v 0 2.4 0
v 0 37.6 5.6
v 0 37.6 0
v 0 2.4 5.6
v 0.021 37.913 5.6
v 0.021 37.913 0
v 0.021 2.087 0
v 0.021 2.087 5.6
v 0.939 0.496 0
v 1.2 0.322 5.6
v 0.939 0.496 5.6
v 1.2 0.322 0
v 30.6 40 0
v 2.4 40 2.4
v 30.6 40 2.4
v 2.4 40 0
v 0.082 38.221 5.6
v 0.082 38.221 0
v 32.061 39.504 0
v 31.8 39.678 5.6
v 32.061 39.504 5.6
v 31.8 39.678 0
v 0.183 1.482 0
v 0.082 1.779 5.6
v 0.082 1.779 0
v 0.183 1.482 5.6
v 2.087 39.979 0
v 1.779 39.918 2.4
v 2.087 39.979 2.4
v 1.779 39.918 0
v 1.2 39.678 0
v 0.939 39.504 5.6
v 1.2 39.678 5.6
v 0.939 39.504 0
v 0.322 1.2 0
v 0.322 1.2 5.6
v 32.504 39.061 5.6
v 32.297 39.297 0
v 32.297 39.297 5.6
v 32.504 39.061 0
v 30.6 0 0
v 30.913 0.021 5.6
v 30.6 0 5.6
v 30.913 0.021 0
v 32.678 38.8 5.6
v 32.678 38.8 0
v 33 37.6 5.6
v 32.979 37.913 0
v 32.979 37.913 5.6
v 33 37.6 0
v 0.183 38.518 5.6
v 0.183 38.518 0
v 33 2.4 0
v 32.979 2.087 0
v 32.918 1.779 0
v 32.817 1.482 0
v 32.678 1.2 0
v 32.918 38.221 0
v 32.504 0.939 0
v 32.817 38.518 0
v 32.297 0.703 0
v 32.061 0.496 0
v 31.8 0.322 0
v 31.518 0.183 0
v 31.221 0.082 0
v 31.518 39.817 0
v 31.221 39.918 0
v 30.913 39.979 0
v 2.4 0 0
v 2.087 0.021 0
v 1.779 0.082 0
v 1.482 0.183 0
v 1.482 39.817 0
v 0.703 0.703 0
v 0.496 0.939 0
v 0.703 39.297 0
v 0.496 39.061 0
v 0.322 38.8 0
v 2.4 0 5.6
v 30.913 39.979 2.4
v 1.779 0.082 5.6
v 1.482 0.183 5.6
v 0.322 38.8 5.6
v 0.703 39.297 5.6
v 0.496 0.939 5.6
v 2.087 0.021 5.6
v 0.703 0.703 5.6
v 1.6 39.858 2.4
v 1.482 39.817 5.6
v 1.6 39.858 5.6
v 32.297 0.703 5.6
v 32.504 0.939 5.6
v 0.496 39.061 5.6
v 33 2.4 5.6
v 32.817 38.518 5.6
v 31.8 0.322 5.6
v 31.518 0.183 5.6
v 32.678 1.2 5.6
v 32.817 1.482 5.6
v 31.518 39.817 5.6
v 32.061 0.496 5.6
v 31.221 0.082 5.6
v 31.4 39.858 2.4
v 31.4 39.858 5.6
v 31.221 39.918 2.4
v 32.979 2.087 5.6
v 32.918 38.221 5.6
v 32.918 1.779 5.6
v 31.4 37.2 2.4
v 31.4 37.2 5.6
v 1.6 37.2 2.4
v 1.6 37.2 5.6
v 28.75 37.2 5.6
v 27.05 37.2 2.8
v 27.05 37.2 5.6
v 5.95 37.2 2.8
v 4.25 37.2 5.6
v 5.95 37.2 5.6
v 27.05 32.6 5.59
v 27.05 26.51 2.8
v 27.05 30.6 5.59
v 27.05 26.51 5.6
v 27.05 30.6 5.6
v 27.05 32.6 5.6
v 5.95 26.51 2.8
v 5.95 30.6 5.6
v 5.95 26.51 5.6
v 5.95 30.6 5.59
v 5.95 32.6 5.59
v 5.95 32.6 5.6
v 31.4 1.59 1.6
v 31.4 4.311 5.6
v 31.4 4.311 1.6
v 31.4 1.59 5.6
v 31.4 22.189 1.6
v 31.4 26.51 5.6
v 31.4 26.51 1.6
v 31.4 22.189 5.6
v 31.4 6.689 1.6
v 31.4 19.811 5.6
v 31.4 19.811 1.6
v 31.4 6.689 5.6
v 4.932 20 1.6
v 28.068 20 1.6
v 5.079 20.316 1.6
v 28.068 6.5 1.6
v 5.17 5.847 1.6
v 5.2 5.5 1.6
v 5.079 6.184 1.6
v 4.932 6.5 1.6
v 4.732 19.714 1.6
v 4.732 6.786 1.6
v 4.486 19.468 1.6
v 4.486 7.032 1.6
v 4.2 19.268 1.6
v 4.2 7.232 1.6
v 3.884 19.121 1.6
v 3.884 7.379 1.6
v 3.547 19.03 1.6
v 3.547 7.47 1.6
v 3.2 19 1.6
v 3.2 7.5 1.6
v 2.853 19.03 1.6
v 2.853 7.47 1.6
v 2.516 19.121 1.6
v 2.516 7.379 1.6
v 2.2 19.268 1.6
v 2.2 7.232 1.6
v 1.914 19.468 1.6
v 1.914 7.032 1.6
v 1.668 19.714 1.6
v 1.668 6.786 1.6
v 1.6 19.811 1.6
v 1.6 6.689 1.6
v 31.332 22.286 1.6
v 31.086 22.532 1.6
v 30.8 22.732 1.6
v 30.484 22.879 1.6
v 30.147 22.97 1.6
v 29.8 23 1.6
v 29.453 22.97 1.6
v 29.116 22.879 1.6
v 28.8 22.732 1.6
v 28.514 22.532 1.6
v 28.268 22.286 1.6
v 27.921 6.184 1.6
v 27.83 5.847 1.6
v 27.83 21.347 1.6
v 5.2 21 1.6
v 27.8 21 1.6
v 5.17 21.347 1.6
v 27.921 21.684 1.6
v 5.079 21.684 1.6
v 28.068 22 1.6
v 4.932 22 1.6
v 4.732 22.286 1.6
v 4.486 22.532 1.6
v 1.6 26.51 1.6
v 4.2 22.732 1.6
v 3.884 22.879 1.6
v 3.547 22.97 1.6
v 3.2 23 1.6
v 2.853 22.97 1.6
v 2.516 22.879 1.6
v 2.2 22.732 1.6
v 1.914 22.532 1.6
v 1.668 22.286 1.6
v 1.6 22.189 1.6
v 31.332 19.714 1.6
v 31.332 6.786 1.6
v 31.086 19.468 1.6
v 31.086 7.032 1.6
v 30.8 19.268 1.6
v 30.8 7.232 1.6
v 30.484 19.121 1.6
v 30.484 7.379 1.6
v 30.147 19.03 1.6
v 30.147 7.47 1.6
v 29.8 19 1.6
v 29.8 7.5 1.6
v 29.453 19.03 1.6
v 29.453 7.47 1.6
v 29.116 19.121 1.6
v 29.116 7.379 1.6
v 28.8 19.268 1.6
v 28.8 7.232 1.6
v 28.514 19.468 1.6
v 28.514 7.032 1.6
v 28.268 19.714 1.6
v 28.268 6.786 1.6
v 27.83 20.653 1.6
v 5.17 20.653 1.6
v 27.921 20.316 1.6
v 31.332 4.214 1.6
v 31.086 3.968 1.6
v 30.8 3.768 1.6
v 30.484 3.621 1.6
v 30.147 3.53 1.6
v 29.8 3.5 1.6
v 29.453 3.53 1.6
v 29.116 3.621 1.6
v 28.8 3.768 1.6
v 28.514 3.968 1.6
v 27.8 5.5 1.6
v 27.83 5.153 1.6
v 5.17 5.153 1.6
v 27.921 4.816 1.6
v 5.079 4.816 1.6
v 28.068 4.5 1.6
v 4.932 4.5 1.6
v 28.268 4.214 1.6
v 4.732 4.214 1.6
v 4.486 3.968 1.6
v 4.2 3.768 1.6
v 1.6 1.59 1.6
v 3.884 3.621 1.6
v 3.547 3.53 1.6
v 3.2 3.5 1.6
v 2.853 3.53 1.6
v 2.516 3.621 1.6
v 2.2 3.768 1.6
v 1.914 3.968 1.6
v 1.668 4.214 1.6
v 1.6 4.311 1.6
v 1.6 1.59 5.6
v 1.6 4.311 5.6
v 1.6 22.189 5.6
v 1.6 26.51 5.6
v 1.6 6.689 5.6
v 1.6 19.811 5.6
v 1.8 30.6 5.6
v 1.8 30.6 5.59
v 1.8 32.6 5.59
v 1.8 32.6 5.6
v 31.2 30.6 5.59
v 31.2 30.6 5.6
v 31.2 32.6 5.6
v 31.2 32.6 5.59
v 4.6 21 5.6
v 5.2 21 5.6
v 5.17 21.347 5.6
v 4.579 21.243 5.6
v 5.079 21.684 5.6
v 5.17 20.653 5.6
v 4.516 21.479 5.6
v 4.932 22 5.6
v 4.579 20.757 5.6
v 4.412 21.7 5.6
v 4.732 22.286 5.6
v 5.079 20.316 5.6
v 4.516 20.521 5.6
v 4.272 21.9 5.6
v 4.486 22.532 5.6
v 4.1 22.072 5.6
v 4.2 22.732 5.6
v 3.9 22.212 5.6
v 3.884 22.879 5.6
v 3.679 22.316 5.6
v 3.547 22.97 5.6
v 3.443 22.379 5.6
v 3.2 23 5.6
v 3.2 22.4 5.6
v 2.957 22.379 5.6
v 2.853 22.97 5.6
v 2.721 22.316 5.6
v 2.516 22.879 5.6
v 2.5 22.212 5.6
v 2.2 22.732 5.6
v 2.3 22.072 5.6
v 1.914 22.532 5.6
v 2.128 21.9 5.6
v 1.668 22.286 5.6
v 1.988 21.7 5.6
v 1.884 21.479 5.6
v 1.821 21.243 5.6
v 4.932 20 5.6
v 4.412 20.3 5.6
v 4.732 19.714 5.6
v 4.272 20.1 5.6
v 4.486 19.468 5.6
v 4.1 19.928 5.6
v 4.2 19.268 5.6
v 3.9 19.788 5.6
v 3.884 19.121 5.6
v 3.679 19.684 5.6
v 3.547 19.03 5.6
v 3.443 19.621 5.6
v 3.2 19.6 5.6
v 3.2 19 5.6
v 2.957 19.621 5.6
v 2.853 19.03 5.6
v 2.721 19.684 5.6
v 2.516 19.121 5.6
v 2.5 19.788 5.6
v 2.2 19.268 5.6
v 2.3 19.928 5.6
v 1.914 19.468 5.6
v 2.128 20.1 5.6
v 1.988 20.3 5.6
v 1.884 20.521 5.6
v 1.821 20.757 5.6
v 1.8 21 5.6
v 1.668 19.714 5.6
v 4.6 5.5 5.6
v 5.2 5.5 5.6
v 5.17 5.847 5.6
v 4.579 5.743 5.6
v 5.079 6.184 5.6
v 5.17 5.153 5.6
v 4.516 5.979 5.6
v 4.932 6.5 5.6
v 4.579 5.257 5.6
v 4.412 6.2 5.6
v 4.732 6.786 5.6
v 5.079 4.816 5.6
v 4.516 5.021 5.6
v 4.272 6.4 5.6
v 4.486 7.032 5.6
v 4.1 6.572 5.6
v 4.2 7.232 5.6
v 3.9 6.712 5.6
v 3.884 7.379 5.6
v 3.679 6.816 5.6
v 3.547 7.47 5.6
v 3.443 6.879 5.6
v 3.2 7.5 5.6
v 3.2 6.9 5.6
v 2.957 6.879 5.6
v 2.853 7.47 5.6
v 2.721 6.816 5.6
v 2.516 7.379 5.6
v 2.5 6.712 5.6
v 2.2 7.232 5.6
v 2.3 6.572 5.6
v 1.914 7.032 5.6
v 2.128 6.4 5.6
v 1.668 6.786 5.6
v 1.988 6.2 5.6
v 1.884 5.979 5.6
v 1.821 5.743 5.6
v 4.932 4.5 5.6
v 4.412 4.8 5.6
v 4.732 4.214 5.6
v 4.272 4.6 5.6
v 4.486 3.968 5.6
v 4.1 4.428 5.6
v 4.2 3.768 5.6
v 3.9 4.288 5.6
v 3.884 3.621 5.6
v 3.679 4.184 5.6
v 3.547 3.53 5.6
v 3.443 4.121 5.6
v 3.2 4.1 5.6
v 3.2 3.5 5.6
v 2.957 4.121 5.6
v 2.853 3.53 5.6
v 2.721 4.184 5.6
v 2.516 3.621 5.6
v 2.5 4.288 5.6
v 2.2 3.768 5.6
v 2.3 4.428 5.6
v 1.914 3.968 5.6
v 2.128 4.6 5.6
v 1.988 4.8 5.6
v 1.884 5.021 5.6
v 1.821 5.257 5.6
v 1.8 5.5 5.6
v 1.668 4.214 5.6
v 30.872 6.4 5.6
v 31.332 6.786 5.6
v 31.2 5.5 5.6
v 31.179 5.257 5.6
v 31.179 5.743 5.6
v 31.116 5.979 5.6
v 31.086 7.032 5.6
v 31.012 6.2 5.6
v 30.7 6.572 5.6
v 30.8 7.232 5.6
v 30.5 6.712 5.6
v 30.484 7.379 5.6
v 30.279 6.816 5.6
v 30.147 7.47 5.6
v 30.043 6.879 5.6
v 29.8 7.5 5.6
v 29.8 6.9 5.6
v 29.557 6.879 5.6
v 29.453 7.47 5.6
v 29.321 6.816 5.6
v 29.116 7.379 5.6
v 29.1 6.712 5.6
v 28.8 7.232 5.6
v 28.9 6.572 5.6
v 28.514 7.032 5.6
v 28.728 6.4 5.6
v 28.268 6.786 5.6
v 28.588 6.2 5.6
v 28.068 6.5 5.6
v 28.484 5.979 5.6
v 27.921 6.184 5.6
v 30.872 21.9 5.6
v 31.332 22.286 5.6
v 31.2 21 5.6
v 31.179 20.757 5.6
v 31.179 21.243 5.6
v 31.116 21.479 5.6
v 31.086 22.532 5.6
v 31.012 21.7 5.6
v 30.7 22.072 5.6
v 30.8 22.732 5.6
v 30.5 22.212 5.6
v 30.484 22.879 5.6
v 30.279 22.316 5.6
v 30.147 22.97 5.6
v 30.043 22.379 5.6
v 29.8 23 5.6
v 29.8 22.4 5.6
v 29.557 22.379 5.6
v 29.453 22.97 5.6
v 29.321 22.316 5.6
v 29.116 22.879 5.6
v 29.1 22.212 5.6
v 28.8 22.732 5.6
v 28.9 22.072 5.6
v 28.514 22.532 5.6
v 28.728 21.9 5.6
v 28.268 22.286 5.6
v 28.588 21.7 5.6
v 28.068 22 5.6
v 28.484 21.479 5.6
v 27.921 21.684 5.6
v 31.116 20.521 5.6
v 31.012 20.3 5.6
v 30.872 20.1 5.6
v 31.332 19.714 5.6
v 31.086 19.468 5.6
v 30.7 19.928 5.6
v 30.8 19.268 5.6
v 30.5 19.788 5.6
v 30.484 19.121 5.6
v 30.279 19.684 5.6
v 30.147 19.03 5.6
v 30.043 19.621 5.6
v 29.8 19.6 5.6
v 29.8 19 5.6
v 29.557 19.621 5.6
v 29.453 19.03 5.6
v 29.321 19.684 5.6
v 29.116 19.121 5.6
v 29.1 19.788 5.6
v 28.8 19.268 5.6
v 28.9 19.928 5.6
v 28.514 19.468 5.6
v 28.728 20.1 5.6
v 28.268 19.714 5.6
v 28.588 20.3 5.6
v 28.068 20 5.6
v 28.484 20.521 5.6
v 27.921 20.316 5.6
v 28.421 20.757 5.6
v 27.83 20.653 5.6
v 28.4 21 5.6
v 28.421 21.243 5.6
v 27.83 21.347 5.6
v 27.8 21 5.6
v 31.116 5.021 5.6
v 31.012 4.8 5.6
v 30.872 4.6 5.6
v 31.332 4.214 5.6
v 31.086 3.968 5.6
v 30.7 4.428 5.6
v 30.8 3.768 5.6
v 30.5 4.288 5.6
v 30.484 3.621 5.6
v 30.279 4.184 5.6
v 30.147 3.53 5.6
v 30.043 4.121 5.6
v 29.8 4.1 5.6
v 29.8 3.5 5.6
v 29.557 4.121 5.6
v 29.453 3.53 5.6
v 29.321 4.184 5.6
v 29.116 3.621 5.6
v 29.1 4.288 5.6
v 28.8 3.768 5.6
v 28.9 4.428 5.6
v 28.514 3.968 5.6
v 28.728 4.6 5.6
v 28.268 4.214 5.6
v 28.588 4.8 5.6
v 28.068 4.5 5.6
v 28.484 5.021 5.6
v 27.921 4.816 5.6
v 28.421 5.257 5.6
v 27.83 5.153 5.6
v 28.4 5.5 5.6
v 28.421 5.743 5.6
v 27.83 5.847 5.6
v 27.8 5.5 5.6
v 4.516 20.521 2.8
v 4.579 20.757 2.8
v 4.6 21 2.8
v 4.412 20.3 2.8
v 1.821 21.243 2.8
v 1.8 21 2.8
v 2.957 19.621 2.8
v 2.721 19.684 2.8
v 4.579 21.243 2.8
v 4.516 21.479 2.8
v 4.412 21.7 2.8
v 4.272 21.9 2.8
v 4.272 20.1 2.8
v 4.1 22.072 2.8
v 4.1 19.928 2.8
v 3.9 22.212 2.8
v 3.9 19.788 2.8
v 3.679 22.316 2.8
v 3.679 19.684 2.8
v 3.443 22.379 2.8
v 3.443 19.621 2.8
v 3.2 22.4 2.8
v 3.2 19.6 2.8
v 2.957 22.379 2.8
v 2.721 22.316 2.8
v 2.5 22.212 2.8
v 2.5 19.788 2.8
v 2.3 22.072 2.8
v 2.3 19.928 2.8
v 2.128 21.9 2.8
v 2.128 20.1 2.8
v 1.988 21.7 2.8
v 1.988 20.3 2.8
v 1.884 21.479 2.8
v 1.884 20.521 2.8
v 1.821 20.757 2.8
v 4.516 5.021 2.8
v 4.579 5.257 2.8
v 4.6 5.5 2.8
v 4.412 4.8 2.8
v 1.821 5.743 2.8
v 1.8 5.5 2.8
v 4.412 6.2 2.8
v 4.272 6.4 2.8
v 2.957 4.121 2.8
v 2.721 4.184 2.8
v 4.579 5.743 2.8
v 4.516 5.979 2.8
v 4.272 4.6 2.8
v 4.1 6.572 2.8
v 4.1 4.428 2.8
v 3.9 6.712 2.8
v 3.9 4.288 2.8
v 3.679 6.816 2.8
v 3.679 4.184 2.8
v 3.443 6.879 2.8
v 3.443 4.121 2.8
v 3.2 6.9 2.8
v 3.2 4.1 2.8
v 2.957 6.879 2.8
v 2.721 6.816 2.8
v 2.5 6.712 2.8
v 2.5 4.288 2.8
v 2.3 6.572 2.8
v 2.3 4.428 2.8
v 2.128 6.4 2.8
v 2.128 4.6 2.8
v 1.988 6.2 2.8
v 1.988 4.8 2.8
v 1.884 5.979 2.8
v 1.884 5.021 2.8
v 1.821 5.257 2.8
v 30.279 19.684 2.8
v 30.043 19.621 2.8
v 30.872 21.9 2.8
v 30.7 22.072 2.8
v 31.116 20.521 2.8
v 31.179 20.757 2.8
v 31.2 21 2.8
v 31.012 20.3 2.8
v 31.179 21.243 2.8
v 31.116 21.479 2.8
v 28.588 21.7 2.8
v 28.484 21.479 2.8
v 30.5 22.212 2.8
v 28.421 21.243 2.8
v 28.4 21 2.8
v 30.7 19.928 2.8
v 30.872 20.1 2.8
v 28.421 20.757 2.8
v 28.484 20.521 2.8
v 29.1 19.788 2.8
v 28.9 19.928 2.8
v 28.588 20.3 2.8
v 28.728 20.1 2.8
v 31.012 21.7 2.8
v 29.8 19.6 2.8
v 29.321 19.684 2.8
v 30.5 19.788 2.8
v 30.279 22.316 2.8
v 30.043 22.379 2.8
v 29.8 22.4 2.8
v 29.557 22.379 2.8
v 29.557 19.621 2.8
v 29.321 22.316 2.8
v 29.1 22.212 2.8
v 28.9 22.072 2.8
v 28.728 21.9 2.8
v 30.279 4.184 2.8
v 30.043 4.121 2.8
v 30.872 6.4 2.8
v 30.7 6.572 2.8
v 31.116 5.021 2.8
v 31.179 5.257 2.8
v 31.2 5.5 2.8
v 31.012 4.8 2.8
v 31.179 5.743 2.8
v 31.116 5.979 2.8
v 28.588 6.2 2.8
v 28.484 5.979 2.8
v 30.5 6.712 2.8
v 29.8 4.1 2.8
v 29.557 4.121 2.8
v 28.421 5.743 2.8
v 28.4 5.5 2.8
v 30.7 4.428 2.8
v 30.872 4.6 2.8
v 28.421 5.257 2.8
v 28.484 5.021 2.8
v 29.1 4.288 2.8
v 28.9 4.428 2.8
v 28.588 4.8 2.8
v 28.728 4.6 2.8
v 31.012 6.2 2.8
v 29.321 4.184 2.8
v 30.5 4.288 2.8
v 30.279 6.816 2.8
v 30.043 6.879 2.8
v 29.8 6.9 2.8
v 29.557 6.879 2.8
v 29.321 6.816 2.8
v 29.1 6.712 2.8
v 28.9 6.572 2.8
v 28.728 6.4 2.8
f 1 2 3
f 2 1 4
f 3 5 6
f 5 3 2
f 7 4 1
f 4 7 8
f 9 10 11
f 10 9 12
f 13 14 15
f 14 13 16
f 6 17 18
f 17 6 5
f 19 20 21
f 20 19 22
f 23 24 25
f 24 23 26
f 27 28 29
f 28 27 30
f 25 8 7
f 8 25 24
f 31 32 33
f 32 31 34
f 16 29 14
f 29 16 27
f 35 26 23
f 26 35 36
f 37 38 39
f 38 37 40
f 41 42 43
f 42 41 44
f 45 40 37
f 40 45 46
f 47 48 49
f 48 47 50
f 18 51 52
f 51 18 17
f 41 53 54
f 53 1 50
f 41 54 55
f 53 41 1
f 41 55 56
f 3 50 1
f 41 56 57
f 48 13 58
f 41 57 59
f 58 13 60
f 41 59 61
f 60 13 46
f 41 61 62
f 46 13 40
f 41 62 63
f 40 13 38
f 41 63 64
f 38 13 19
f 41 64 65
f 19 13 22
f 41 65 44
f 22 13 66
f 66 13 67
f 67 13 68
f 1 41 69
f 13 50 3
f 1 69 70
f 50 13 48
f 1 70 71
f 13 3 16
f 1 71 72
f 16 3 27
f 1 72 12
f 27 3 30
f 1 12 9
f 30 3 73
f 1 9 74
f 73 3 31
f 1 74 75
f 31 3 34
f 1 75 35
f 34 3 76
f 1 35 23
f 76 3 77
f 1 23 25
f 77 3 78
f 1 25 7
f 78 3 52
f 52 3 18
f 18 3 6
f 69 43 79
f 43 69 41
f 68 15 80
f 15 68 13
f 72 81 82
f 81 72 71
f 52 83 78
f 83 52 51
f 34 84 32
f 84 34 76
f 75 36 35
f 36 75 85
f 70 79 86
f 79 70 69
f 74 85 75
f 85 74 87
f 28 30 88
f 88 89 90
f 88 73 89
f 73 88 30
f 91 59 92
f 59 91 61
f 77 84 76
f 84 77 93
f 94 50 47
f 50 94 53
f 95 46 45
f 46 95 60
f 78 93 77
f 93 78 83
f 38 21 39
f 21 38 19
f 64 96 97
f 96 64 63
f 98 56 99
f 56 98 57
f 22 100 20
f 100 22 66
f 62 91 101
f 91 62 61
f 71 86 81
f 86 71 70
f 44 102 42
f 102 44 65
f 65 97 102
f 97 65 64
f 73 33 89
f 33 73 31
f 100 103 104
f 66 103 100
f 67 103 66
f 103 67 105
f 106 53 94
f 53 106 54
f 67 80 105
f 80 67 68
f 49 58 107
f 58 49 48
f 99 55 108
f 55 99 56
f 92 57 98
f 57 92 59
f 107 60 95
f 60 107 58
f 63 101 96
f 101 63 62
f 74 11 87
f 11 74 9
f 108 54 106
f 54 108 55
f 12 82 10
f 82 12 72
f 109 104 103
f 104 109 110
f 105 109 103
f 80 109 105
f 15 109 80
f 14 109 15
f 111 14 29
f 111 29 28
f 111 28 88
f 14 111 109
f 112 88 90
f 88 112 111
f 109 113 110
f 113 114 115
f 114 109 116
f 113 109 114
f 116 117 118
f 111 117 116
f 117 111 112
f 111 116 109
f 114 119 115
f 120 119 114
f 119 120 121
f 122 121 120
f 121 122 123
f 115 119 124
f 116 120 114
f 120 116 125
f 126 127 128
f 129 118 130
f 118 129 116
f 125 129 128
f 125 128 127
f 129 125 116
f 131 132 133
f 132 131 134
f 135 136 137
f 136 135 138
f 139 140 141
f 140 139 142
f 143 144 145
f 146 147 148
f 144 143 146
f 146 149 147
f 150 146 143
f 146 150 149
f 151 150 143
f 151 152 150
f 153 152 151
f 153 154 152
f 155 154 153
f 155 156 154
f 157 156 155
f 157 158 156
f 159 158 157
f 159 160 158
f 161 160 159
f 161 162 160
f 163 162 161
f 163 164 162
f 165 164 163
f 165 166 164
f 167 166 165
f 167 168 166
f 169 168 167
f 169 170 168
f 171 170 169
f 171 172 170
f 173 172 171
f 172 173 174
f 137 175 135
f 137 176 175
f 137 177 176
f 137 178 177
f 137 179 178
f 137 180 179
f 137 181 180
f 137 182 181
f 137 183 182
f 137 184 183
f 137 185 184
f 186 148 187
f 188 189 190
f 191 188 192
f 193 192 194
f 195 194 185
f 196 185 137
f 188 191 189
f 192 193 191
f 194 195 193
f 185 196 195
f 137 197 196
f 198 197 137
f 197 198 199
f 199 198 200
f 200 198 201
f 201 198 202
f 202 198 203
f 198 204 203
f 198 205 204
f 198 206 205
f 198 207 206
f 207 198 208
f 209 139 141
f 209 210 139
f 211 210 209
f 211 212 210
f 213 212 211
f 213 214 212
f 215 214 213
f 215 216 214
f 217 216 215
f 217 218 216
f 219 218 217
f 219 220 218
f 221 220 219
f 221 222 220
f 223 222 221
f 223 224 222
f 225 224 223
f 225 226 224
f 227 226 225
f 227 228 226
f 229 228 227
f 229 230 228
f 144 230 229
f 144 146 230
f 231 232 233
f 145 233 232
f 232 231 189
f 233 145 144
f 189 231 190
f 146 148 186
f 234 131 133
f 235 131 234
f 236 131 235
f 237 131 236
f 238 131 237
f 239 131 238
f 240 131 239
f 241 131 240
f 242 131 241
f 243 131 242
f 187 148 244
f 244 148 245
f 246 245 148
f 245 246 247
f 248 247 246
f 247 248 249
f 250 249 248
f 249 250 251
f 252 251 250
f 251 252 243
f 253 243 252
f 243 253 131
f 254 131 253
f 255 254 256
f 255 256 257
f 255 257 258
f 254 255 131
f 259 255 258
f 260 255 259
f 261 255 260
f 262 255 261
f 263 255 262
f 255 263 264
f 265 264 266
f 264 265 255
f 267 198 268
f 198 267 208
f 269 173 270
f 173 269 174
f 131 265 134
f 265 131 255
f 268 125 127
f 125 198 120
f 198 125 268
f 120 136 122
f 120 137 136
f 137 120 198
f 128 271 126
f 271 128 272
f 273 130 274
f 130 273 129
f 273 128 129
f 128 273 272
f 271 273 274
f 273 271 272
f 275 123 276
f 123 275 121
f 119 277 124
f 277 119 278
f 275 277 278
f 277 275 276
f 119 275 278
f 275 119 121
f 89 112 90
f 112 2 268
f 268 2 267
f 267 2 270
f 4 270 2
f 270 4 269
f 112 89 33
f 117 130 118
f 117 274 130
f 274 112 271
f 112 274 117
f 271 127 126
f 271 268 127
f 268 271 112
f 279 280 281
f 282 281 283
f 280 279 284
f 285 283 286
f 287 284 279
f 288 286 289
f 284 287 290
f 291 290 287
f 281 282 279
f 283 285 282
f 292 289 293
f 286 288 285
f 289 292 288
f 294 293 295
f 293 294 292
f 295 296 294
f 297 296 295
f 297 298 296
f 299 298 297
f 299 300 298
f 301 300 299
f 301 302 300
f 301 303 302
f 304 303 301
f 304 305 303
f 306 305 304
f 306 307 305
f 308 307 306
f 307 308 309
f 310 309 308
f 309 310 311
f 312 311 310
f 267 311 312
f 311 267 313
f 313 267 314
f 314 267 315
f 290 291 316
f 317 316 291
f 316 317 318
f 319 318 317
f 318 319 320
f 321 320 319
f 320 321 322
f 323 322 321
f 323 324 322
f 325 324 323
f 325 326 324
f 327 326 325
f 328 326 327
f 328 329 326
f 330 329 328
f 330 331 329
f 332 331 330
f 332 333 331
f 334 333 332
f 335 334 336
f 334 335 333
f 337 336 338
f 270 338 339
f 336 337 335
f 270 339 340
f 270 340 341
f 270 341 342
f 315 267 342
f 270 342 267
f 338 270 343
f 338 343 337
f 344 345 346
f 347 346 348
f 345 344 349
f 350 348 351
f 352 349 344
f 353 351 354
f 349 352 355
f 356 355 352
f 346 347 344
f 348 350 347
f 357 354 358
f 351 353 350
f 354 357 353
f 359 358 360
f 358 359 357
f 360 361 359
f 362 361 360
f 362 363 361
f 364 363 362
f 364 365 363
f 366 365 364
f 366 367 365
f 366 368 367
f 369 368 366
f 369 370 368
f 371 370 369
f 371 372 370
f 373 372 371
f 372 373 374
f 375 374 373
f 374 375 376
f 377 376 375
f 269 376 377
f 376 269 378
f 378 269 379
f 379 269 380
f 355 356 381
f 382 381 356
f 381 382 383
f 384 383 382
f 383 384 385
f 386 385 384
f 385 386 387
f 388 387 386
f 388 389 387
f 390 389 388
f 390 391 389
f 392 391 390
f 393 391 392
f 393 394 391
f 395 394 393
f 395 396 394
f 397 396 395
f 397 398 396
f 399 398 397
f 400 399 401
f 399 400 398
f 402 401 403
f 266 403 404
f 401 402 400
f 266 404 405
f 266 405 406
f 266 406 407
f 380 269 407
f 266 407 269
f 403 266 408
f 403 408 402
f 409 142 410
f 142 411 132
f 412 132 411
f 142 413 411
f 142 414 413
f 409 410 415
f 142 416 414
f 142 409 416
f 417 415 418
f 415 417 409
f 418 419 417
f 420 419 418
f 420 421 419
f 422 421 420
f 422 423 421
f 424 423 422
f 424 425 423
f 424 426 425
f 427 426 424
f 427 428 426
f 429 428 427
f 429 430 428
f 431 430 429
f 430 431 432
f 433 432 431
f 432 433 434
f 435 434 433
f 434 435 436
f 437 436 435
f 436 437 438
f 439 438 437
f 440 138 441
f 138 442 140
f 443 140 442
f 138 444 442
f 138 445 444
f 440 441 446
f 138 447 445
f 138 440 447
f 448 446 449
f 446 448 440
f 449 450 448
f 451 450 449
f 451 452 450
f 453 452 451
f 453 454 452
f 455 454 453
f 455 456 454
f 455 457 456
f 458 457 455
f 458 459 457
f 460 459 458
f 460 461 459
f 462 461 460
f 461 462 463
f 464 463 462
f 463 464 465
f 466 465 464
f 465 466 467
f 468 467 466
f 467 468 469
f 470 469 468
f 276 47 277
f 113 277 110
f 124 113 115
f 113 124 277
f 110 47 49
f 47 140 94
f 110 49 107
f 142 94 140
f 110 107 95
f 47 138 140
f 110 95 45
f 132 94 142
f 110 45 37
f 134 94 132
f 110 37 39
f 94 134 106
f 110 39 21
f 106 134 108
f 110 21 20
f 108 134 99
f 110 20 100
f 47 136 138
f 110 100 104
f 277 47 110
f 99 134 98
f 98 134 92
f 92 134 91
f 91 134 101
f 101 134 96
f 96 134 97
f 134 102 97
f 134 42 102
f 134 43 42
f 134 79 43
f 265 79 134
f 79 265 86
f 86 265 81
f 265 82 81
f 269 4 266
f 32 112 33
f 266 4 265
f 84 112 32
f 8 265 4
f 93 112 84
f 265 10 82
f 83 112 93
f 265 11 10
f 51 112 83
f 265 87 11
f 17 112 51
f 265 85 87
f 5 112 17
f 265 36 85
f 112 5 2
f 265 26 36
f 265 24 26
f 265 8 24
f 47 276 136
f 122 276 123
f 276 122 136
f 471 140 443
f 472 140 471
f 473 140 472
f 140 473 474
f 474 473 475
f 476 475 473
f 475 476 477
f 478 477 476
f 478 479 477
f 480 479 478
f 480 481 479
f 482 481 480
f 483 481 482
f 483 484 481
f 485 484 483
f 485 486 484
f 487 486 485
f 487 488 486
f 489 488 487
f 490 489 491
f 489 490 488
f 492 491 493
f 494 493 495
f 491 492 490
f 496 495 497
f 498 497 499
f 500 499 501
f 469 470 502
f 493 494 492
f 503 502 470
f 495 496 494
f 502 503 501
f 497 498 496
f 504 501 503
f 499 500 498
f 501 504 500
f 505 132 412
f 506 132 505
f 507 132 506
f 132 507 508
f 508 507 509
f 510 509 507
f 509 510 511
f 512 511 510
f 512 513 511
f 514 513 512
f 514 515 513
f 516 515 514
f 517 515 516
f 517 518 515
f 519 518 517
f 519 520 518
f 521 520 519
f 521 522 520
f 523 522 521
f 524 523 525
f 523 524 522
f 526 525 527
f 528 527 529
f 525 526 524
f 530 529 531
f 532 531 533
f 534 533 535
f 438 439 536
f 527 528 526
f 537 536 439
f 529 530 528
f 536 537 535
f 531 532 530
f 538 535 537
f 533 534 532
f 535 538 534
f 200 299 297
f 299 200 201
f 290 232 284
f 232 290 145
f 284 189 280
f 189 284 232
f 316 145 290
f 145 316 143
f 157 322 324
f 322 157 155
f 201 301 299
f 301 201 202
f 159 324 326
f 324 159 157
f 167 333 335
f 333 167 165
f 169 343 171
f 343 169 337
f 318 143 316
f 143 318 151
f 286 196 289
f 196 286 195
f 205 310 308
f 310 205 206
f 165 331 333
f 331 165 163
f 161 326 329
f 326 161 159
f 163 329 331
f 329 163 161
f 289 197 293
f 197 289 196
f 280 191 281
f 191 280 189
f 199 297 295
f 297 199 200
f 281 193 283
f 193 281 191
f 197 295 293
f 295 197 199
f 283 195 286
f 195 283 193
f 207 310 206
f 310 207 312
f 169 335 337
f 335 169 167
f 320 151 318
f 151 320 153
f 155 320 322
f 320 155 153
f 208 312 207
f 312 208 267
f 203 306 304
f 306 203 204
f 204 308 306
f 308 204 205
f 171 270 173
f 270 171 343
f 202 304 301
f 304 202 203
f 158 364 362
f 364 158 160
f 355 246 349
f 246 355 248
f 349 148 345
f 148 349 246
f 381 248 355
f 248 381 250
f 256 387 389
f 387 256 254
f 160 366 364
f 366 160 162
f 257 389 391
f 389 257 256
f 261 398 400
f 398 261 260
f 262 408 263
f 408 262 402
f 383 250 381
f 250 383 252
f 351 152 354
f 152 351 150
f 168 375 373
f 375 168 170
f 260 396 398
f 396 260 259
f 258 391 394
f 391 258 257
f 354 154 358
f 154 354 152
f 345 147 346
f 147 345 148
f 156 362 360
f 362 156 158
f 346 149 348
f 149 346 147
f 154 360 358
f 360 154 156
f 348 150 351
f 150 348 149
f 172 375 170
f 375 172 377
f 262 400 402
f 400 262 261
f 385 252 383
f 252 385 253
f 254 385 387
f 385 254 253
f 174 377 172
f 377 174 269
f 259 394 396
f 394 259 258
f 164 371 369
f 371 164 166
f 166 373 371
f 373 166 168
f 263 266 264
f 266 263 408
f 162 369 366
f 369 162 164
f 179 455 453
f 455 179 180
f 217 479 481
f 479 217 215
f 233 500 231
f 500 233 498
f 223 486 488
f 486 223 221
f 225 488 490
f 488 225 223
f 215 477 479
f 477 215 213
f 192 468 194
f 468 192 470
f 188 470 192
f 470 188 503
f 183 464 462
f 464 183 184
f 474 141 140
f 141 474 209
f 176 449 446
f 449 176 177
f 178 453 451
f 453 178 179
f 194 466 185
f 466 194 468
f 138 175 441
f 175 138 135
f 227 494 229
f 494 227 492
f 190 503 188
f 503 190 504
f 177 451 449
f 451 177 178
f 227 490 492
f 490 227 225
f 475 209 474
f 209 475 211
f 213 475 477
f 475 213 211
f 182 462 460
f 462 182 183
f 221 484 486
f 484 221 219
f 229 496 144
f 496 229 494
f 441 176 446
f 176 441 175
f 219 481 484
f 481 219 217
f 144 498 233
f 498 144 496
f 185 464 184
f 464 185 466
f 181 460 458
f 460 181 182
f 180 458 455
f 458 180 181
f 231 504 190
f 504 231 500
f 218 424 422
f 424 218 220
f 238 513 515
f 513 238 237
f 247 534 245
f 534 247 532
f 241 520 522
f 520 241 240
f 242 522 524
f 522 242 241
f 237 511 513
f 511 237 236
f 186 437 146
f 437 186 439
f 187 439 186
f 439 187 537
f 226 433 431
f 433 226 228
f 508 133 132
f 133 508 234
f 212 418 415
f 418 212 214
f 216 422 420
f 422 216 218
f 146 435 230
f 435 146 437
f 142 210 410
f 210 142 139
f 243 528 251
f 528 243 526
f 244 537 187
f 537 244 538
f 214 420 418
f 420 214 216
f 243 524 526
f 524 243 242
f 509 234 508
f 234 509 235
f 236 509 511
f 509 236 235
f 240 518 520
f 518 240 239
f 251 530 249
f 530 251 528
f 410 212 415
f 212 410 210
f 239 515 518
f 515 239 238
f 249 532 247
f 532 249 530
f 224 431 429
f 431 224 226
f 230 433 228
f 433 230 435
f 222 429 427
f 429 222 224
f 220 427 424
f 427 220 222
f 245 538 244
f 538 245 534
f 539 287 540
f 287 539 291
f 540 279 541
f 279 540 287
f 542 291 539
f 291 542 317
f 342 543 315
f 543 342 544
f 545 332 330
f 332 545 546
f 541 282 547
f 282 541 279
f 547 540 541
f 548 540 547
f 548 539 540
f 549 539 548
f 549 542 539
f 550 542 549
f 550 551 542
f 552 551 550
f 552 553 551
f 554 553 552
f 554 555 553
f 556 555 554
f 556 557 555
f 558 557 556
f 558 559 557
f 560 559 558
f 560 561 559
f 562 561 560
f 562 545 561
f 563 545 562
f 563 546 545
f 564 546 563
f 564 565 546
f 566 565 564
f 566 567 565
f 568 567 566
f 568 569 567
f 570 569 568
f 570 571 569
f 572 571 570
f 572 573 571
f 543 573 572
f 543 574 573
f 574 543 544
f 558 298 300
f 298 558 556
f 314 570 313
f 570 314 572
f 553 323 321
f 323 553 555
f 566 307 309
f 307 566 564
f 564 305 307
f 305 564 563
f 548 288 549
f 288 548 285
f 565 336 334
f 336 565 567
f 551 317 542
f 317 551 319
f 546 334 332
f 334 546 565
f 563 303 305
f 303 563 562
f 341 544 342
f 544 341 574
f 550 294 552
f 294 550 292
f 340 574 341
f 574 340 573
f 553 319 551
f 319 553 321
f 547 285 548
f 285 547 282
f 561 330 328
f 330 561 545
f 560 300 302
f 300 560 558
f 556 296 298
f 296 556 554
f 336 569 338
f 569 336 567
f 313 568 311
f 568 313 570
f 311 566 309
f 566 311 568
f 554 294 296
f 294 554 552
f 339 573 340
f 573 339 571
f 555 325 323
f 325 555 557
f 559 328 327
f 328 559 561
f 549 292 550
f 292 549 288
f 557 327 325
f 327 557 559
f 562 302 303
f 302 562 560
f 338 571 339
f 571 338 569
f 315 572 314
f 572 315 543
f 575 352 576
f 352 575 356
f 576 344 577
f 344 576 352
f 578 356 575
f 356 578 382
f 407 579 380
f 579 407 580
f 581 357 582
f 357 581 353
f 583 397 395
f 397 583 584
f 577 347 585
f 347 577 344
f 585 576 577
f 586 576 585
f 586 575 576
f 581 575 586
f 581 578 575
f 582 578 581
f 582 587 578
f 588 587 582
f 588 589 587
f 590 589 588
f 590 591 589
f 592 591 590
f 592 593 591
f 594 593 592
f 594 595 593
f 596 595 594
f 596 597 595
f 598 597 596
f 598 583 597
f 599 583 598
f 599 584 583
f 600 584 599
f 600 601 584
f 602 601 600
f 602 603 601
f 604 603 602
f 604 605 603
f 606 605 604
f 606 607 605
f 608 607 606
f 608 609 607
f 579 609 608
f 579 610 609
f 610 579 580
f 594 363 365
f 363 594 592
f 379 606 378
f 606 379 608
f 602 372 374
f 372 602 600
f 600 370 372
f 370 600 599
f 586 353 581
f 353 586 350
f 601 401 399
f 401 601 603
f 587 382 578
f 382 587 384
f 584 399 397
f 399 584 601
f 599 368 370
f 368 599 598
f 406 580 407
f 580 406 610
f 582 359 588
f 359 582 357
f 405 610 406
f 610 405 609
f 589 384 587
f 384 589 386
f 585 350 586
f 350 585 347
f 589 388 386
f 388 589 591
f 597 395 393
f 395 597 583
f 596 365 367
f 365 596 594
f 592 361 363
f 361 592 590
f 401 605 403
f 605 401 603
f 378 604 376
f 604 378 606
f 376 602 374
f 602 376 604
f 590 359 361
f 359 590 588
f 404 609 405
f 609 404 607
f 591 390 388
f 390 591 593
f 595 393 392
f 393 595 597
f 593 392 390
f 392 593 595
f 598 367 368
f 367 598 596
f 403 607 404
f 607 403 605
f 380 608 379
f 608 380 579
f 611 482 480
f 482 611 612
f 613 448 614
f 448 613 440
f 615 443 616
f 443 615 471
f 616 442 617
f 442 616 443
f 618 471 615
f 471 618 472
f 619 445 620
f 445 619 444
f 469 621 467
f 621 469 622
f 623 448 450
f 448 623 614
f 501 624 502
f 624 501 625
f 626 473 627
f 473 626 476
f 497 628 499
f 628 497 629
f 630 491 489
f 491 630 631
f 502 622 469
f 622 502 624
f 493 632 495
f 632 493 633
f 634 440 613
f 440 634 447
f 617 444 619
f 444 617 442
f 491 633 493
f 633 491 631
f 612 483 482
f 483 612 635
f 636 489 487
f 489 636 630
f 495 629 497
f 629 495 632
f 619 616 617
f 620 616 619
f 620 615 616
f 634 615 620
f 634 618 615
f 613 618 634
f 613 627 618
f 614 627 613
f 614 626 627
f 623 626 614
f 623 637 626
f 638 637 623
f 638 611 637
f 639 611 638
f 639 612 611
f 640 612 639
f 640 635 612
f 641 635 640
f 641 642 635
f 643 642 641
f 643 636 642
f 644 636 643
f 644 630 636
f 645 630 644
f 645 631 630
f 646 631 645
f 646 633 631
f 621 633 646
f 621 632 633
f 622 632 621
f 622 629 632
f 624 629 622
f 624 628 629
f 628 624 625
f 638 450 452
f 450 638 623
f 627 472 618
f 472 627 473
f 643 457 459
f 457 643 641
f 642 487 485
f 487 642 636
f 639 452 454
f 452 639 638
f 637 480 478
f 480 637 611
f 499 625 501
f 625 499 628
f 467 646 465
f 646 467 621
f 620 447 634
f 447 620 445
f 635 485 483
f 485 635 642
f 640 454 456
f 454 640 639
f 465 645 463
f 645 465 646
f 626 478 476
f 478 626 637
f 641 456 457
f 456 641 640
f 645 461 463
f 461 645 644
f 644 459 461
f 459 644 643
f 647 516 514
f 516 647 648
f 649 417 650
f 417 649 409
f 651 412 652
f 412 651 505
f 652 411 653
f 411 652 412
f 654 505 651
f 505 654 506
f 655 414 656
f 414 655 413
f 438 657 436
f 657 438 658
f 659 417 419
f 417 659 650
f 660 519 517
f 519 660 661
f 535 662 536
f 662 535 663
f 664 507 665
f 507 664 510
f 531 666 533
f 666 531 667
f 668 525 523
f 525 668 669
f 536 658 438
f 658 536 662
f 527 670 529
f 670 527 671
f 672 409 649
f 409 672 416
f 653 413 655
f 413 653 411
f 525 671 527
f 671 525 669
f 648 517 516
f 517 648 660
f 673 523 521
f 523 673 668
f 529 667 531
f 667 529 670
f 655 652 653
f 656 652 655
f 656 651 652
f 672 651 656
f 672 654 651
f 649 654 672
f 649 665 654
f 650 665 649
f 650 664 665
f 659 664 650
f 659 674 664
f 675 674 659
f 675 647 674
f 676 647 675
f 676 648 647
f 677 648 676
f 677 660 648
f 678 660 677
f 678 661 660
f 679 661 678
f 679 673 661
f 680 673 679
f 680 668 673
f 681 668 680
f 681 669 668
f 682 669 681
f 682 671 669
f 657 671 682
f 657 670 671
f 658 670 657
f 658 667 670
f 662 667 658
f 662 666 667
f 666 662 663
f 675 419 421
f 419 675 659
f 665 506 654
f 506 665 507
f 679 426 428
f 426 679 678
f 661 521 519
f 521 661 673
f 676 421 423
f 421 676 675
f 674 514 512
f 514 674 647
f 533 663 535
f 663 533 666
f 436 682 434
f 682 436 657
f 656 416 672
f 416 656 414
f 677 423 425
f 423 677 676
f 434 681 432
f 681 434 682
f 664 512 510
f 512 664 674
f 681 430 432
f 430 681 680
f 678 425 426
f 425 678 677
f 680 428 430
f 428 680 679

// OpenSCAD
// file: dimensions.scad
// Shared dimensions for the RG1N-1-4 loopback case.
// All dimensions are in millimetres.

// Requested finished envelope. The socket face is flush with the front.
case_length = 40;

// Published RG1N-1-4 socket dimensions.
connector_flange_width = 29.4;
connector_flange_height = 12;
connector_flange_thickness = 2.5; // maximum
connector_rear_projection = 12.5; // maximum, behind the mounting face

// Published mounting geometry. The original latch hardware uses these holes.
mounting_hole_spacing = 24.5;
mounting_thread = 2;

// The rear body is not separately dimensioned in the available drawing.
// These conservative defaults are estimated from that drawing and photos.
connector_body_width = 20.5;
connector_body_height = 11;

// Four extrusion lines with a 0.4 mm nozzle.
wall = 1.6;
back_wall = 1.6;

// FDM fit allowances, applied on each side unless noted otherwise.
flange_clearance = 0.2;
body_clearance = 0.3;

flange_pocket_width = connector_flange_width + 2 * flange_clearance;
flange_pocket_height = connector_flange_height + 2 * flange_clearance;
flange_pocket_depth = connector_flange_thickness + 0.3;

body_cavity_width = connector_body_width + 2 * body_clearance;
body_cavity_height = connector_body_height + 2 * body_clearance;
body_cavity_end = connector_rear_projection + 1.0;

// The wire chamber opens up behind the solder terminals.
wire_cavity_width = flange_pocket_width;
wire_cavity_height = 14;

case_width = wire_cavity_width + 2 * wall;
case_height = wire_cavity_height + 2 * wall;
// A deeper lower half keeps the longitudinal screw and nut features out of
// the seam while still leaving the connector easy to place from above.
split_height = case_height - 5.6;
corner_radius = 2.4;

// M2 bolts through the connector engage captive standard M2 hex nuts.
mounting_boss_diameter = 6;
mounting_boss_start = flange_pocket_depth;
mounting_boss_end = 11.5;
mounting_screw_clearance_diameter = 2.4;
mounting_nut_across_corners = 4.9;
mounting_nut_pocket_length = 2;
mounting_nut_center_y = 8.4;
mounting_axis_z = case_height / 2;
mounting_x_positions = [
    case_width / 2 - mounting_hole_spacing / 2,
    case_width / 2 + mounting_hole_spacing / 2
];

// Four vertical pins align and lightly retain the lid.
boss_diameter = 4;
pin_diameter = 2.4;
pin_height = 2.4;
pin_hole_diameter = 2.8;
pin_hole_depth = 2.8;
pin_x_positions = [wall + boss_diameter / 2 - 0.4,
                   case_width - wall - boss_diameter / 2 + 0.4];
pin_y_positions = [19, 34.5];

epsilon = 0.01;
// file: case-lib.scad
include <dimensions.scad>

module rounded_xy_box(size, radius, fn = 48) {
    hull()
        for (x = [radius, size[0] - radius])
            for (y = [radius, size[1] - radius])
                translate([x, y, 0])
                    cylinder(h = size[2], r = radius, $fn = fn);
}

module centered_cavity(width, height, y, length) {
    translate([
        (case_width - width) / 2,
        y,
        (case_height - height) / 2
    ])
        cube([width, length, height]);
}

module hollow_case() {
    difference() {
        rounded_xy_box(
            [case_width, case_length, case_height],
            corner_radius
        );

        // Full flange recess, open at the connector face.
        centered_cavity(
            flange_pocket_width,
            flange_pocket_height,
            -epsilon,
            flange_pocket_depth + epsilon
        );

        // Close-fitting throat around the connector body and terminals.
        centered_cavity(
            body_cavity_width,
            body_cavity_height,
            flange_pocket_depth - epsilon,
            body_cavity_end - flange_pocket_depth + 2 * epsilon
        );

        // Larger chamber for the folded loopback wiring.
        centered_cavity(
            wire_cavity_width,
            wire_cavity_height,
            body_cavity_end - epsilon,
            case_length - back_wall - body_cavity_end + 2 * epsilon
        );
    }
}

module mounting_bosses() {
    union() {
        for (x = mounting_x_positions)
            translate([x, mounting_boss_start, mounting_axis_z])
                rotate([-90, 0, 0])
                    cylinder(
                        h = mounting_boss_end - mounting_boss_start,
                        d = mounting_boss_diameter,
                        $fn = 48
                    );

        // Solid buttresses project both horizontal bosses to the printed
        // floor. Their inner edges stop at the connector-body cavity.
        translate([0, mounting_boss_start, wall])
            cube([
                (case_width - body_cavity_width) / 2,
                mounting_boss_end - mounting_boss_start,
                mounting_axis_z - wall
            ]);

        translate([
            (case_width + body_cavity_width) / 2,
            mounting_boss_start,
            wall
        ])
            cube([
                (case_width - body_cavity_width) / 2,
                mounting_boss_end - mounting_boss_start,
                mounting_axis_z - wall
            ]);
    }
}

module mounting_screw_bores() {
    for (x = mounting_x_positions)
        translate([x, -epsilon, mounting_axis_z])
            rotate([-90, 0, 0])
                cylinder(
                    h = mounting_boss_end + 2 * epsilon,
                    d = mounting_screw_clearance_diameter,
                    $fn = 36
                );
}

module mounting_nut_traps() {
    for (x = mounting_x_positions) {
        // Hexagonal pocket with its axis parallel to the mounting bolt.
        translate([
            x,
            mounting_nut_center_y - mounting_nut_pocket_length / 2,
            mounting_axis_z
        ])
            rotate([-90, 0, 0])
                cylinder(
                    h = mounting_nut_pocket_length,
                    d = mounting_nut_across_corners,
                    $fn = 6
                );

        // Loading slot opens into the lower half before the lid is fitted.
        translate([
            x - mounting_nut_across_corners / 2,
            mounting_nut_center_y - mounting_nut_pocket_length / 2,
            mounting_axis_z
        ])
            cube([
                mounting_nut_across_corners,
                mounting_nut_pocket_length,
                split_height - mounting_axis_z + epsilon
            ]);
    }
}

module mounted_case_shell() {
    difference() {
        union() {
            hollow_case();
            mounting_bosses();
        }

        mounting_screw_bores();
        mounting_nut_traps();
    }
}

module lower_half_volume() {
    translate([-epsilon, -epsilon, -epsilon])
        cube([
            case_width + 2 * epsilon,
            case_length + 2 * epsilon,
            split_height + epsilon
        ]);
}

module upper_half_volume() {
    translate([-epsilon, -epsilon, split_height])
        cube([
            case_width + 2 * epsilon,
            case_length + 2 * epsilon,
            case_height - split_height + epsilon
        ]);
}

module pin_bosses(z, height) {
    for (x = pin_x_positions)
        for (y = pin_y_positions)
            translate([x, y, z])
                cylinder(h = height, d = boss_diameter, $fn = 36);
}

module alignment_pins() {
    for (x = pin_x_positions)
        for (y = pin_y_positions)
            translate([x, y, split_height - epsilon])
                cylinder(
                    h = pin_height + epsilon,
                    d = pin_diameter,
                    $fn = 36
                );
}

module alignment_holes() {
    for (x = pin_x_positions)
        for (y = pin_y_positions)
            translate([x, y, split_height - epsilon])
                cylinder(
                    h = pin_hole_depth + epsilon,
                    d = pin_hole_diameter,
                    $fn = 36
                );
}

module case_base() {
    union() {
        intersection() {
            mounted_case_shell();
            lower_half_volume();
        }

        // The lower boss joins the floor and side wall to support each pin.
        intersection() {
            pin_bosses(wall, split_height - wall);
            lower_half_volume();
        }

        alignment_pins();
    }
}

module case_lid() {
    difference() {
        union() {
            intersection() {
                mounted_case_shell();
                upper_half_volume();
            }

            pin_bosses(
                split_height,
                case_height - wall - split_height
            );
        }

        alignment_holes();
    }
}

module printable_lid() {
    // Put the outer top face on the bed so the cavity prints upward.
    translate([0, case_length, case_height])
        rotate([180, 0, 0])
            case_lid();
}
// main file
// Upper half of the RG1N-1-4 loopback enclosure.
// The library flips it into its support-free print orientation.

use <case-lib.scad>

printable_lid();
